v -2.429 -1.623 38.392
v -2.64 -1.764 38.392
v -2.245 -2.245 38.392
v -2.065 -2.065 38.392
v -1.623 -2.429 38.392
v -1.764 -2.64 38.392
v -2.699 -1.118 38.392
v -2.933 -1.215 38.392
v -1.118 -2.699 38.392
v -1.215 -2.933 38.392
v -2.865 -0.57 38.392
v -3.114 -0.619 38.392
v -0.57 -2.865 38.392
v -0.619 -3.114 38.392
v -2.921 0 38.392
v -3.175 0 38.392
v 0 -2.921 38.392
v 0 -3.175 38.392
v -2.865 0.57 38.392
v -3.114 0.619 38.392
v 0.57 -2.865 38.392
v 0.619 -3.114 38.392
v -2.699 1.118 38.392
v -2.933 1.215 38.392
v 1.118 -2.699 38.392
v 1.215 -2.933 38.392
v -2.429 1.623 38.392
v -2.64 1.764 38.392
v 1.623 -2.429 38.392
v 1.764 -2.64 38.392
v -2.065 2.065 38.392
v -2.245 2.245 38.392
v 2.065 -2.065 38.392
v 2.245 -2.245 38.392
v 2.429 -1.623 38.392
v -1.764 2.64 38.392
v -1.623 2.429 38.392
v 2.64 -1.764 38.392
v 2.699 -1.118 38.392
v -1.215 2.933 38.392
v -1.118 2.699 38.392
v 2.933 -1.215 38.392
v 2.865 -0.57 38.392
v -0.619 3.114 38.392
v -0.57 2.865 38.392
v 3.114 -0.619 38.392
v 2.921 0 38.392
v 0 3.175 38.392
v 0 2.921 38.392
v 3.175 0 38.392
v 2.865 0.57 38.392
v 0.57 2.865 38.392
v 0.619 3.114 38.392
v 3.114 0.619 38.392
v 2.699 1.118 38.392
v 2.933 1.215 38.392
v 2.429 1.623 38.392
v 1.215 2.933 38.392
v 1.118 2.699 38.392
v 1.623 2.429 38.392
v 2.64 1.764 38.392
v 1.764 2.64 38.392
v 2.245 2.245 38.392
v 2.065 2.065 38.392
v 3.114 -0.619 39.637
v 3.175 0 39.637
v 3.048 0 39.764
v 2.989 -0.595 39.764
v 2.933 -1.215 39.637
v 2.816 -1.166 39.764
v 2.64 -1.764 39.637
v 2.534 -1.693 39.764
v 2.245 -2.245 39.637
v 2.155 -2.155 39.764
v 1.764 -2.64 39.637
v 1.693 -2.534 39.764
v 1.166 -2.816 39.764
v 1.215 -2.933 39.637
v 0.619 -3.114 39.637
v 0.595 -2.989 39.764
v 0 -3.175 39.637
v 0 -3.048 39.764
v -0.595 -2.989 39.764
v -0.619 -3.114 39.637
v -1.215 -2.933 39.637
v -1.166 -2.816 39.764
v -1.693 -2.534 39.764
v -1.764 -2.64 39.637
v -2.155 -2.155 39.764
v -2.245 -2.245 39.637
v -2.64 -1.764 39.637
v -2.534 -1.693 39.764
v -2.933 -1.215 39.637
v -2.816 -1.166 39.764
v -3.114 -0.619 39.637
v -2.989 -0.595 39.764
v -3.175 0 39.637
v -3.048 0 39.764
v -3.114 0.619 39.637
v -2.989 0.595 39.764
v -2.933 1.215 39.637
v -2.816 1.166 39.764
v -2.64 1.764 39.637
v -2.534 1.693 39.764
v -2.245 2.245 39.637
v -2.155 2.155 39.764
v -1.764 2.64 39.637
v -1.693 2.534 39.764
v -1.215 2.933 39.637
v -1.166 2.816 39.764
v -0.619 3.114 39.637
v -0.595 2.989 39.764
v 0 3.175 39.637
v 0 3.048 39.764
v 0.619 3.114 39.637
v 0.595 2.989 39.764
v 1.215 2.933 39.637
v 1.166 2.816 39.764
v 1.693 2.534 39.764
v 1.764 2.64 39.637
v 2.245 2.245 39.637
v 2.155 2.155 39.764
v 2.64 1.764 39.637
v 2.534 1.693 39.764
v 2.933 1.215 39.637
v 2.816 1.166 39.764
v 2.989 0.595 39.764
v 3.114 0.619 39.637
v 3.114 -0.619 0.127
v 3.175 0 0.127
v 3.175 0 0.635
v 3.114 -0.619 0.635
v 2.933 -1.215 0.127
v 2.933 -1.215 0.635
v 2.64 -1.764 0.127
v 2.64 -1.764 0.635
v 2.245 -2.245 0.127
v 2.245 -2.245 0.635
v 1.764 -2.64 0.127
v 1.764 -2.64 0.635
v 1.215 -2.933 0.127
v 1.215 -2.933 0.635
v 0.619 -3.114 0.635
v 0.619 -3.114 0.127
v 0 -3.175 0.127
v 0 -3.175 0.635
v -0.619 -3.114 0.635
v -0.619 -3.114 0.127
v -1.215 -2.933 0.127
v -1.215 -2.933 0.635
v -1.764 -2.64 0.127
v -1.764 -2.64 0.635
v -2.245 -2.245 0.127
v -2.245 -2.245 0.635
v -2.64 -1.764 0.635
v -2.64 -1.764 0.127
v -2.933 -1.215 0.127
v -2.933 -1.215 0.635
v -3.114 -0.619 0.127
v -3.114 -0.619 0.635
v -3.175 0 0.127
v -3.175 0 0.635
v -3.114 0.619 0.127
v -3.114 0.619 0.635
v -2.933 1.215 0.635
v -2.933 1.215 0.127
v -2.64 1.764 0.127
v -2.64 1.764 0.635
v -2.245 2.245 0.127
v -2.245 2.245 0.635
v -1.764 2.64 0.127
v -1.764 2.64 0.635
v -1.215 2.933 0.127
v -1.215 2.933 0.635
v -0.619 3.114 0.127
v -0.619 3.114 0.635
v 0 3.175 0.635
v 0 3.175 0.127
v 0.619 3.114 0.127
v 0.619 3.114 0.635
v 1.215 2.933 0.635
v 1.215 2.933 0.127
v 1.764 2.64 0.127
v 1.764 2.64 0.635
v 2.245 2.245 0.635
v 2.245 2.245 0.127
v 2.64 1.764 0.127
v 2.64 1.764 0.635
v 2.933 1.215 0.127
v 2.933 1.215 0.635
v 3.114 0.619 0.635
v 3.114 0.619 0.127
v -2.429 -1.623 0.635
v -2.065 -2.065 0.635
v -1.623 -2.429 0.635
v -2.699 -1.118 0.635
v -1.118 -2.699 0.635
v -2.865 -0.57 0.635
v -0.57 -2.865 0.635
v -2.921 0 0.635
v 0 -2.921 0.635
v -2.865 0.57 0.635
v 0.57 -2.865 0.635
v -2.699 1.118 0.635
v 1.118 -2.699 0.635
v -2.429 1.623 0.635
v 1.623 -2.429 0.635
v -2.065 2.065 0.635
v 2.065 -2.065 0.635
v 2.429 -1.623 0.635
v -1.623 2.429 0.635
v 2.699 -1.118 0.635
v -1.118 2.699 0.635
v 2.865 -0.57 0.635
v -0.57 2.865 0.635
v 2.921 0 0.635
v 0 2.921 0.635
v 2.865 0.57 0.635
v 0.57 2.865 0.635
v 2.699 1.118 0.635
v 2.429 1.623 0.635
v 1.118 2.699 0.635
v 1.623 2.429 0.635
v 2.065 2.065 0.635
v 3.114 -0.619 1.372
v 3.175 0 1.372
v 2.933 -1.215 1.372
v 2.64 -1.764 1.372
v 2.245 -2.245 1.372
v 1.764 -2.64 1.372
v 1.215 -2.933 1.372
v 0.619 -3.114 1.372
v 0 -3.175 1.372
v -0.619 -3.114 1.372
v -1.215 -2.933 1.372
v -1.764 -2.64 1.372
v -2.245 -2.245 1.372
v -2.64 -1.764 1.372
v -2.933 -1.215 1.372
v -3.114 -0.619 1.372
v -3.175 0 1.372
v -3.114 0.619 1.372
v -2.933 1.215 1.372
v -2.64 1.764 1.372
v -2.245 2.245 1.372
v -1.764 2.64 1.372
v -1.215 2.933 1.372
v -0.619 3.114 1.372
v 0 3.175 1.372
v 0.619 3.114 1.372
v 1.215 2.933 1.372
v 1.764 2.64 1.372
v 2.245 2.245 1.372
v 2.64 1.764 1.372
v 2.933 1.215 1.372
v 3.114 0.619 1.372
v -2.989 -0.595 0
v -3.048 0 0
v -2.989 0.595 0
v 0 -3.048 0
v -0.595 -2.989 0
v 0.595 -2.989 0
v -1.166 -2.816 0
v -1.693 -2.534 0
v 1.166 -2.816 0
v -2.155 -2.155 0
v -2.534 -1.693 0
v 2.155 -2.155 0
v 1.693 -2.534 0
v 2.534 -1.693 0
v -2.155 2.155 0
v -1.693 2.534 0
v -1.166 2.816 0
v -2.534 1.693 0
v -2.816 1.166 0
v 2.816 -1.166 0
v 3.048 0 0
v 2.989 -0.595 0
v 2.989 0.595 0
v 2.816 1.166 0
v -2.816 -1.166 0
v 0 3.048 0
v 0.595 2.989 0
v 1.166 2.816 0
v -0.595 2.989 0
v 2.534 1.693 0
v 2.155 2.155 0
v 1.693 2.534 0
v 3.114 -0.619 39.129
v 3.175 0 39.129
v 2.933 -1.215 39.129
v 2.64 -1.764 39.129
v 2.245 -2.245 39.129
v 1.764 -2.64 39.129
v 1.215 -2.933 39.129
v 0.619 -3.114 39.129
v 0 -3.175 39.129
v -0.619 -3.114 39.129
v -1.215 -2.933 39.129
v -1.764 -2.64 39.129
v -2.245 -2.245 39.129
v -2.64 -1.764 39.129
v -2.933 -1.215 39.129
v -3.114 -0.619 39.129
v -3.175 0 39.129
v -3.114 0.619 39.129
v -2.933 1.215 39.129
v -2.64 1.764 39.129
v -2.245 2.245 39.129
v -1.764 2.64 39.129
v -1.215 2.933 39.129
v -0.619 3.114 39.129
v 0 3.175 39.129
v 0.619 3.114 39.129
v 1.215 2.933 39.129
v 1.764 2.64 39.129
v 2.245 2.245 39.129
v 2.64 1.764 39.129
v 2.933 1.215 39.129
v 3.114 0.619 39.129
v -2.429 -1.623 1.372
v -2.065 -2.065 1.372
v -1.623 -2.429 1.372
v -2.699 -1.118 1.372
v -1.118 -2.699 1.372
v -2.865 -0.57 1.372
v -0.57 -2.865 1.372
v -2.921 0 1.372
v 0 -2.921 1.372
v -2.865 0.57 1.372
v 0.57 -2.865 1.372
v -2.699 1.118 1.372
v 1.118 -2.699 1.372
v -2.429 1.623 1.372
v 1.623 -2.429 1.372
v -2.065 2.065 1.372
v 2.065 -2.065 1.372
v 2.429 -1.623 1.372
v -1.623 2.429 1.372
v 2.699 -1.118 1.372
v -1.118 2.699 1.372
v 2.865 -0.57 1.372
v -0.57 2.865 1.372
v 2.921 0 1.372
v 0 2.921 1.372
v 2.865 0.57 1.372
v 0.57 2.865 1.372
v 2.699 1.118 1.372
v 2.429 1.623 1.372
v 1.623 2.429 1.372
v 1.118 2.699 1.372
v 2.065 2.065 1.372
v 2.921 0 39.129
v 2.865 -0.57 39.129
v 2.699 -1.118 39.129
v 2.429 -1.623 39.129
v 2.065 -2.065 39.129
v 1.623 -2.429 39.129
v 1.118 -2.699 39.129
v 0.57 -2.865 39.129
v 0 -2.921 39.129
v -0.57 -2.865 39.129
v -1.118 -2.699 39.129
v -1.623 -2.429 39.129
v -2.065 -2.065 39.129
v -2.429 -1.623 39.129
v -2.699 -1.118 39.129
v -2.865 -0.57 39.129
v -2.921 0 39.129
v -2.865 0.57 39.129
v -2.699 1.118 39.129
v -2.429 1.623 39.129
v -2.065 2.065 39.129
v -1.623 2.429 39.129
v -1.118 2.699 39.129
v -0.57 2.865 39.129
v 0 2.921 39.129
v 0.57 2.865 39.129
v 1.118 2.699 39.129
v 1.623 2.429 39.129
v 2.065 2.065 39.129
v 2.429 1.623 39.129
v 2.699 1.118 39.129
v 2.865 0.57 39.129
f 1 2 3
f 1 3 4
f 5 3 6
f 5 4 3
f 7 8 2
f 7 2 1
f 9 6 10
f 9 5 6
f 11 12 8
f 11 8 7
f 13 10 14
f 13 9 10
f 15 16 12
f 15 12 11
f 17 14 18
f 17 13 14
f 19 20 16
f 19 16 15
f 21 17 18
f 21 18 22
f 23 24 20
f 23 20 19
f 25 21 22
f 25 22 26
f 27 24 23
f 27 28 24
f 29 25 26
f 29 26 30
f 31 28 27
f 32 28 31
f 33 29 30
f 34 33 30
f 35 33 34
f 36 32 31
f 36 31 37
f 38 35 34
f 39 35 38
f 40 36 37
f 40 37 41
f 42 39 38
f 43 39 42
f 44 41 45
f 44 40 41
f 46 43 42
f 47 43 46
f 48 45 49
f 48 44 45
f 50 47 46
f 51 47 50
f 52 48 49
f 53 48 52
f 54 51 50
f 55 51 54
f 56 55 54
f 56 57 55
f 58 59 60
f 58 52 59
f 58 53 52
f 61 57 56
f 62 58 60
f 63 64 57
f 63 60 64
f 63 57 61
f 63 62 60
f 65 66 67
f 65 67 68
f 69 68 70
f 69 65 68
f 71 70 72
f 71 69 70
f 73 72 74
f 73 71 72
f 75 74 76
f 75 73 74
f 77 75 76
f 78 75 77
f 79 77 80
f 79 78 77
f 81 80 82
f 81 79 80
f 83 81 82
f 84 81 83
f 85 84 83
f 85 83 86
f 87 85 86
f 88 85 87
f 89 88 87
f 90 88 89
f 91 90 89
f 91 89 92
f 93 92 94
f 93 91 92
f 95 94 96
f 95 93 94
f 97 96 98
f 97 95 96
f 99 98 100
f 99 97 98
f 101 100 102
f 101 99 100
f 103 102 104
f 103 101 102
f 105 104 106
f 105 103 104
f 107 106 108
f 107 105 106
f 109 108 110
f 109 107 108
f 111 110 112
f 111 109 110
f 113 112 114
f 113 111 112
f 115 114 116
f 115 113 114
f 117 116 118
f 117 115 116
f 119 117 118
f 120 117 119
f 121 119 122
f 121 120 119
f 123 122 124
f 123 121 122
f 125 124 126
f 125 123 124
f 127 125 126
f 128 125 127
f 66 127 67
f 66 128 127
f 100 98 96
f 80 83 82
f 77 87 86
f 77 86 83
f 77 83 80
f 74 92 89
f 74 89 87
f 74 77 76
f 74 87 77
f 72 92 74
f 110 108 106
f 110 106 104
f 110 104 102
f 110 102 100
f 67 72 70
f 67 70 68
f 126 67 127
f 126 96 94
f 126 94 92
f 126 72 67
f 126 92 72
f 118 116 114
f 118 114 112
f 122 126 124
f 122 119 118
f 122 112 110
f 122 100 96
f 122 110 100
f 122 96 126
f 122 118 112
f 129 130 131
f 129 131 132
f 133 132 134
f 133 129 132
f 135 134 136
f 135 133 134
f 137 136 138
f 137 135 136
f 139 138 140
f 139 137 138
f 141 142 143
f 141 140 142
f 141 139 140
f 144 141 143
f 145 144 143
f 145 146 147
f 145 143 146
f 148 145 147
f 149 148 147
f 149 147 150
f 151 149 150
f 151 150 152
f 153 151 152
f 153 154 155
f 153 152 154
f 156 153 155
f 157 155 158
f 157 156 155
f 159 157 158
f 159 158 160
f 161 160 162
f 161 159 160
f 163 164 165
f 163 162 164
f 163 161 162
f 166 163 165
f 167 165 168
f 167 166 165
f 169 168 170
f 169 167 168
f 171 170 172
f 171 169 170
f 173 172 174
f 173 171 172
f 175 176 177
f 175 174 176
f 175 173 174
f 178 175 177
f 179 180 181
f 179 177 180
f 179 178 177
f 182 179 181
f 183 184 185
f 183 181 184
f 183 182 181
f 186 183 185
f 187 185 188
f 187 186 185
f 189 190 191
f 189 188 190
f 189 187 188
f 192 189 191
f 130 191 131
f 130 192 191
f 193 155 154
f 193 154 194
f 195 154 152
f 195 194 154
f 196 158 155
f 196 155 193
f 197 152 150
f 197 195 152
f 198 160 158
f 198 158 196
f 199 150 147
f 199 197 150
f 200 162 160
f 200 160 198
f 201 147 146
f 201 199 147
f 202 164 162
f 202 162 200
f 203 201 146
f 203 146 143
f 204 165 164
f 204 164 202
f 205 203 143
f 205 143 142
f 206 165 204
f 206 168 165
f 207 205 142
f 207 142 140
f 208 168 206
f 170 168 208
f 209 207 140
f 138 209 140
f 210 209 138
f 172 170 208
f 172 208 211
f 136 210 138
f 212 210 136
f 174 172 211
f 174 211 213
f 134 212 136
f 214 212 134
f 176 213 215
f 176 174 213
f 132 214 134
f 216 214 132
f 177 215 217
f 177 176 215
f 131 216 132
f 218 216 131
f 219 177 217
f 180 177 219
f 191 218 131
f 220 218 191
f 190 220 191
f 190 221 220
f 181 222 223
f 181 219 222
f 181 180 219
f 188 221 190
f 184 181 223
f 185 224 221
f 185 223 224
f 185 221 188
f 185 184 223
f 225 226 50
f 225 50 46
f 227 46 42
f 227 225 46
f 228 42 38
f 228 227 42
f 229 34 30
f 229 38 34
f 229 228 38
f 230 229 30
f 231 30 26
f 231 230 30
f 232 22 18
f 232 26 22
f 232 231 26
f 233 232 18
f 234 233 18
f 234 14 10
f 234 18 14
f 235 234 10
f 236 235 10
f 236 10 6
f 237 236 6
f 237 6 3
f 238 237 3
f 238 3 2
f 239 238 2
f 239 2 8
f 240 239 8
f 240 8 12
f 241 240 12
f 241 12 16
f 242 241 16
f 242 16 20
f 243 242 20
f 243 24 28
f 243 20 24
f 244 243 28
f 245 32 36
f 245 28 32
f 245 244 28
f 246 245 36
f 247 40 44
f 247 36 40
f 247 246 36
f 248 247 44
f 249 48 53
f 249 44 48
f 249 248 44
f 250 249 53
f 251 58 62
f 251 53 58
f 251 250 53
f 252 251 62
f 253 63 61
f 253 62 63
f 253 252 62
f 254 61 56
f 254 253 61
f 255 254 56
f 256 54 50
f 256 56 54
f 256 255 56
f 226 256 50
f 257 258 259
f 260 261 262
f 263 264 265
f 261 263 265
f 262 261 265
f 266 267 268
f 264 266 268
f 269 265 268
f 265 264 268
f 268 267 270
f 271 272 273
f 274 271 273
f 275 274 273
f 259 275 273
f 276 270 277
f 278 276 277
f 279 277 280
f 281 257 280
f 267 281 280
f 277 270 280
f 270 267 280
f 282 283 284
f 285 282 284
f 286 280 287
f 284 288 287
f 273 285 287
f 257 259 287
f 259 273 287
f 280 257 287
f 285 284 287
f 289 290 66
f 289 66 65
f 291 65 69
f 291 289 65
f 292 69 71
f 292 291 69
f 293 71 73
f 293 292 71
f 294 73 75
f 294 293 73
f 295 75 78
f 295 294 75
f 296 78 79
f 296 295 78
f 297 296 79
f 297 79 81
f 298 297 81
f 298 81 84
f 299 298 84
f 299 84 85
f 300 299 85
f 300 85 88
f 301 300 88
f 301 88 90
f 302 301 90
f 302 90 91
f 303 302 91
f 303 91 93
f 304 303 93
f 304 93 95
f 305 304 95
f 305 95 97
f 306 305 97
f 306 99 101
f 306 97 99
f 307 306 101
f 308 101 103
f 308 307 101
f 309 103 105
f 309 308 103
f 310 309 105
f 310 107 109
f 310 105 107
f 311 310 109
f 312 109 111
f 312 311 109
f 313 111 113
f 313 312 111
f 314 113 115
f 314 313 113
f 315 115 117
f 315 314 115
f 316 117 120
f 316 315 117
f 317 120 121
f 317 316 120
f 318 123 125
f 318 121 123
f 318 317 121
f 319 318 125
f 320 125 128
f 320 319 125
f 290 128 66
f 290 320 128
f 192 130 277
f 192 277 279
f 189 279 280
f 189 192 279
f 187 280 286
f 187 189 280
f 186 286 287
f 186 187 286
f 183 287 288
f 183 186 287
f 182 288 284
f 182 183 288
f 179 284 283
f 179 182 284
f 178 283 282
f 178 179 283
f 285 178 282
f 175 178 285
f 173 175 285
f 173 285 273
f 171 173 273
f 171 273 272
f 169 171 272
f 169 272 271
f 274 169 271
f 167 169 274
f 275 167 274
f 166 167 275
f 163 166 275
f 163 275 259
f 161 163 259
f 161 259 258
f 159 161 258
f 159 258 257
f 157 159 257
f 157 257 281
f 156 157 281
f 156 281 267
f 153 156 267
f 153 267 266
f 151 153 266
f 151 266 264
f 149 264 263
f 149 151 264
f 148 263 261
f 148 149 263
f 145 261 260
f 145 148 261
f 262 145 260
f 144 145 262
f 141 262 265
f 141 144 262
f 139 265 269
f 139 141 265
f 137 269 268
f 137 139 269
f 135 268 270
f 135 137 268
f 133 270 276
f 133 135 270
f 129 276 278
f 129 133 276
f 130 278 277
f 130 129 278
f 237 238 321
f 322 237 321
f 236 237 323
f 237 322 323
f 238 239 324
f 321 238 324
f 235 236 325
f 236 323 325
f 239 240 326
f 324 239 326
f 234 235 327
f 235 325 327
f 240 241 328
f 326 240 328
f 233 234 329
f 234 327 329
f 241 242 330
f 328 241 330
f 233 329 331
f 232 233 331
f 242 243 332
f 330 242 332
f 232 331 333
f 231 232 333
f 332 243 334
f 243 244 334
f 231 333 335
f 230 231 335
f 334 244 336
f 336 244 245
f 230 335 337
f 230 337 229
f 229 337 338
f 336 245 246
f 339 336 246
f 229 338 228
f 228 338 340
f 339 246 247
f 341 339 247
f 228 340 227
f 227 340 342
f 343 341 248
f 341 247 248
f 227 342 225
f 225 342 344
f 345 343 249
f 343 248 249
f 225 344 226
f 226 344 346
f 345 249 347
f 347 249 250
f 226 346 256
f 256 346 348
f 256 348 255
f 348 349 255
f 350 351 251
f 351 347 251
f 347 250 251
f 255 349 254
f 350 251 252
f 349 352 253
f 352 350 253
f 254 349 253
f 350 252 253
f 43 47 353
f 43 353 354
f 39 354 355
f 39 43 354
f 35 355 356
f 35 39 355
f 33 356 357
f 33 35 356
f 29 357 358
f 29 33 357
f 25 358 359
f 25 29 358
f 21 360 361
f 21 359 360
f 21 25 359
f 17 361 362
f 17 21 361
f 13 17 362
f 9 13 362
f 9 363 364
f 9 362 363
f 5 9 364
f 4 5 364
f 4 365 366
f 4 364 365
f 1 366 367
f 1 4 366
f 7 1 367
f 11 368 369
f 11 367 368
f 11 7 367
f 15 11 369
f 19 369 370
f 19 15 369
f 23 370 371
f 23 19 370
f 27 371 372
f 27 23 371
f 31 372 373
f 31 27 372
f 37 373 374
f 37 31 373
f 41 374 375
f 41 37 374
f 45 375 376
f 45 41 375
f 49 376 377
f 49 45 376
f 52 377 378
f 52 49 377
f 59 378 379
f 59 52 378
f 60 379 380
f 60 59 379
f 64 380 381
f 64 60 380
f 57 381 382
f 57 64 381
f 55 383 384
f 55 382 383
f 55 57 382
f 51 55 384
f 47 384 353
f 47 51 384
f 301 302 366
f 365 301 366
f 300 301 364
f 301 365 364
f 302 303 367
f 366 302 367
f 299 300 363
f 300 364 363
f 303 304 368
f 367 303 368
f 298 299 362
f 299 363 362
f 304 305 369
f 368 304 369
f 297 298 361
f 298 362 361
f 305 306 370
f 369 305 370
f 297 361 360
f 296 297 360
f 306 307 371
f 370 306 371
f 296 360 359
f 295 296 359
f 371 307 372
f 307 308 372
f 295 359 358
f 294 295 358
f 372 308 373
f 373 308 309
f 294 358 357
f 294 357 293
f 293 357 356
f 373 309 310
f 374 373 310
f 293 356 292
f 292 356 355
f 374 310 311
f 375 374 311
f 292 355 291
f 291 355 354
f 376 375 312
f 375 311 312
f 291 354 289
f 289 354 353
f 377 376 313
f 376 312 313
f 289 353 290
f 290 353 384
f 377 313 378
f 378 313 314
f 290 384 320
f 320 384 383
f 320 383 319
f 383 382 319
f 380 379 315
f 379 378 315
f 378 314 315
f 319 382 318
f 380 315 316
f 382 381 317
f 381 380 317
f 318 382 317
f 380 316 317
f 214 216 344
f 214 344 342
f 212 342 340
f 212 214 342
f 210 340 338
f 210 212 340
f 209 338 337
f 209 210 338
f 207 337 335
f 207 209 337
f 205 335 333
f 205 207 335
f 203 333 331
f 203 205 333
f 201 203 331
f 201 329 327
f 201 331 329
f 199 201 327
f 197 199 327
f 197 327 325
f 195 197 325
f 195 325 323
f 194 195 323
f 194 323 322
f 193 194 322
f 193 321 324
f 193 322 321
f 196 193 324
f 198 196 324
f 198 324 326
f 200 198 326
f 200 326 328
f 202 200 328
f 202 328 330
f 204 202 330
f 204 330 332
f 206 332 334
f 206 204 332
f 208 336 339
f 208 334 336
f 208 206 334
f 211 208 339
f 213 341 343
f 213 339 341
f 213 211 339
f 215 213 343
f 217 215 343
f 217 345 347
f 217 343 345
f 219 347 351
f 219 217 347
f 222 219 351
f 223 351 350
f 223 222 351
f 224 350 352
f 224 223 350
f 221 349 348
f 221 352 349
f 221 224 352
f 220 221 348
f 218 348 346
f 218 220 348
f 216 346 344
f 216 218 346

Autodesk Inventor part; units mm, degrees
ref_plane "YZ Plane" through (0, 0, 0) normal (1, 0, 0) x (0, 1, 0)
ref_plane "XZ Plane" through (0, 0, 0) normal (0, 1, 0) x (-1, 0, 0)
ref_plane "XY Plane" through (0, 0, 0) normal (0, 0, 1) x (1, 0, 0)
sketch "Sketch1" plane through (0, 0, 0) normal (0, 0, 1) x (1, 0, 0)
  circle A0 centre (0, 0) radius 3.175
  dimension "d0" = 6.35
extrude "Extrusion1" add sketch "Sketch1" along normal blind 0.635
sketch "Sketch2" plane through (0, 0, 0.635) normal (0, 0, 1) x (1, 0, 0)
  circle A0 centre (0, 0) radius 3.175 projected
  circle A1 centre (0, 0) radius 2.921
  dimension "d6" = 5.842
extrude "Extrusion2" add sketch "Sketch2" along normal blind 0.7366 contours A1
sketch "Sketch3" plane through (0, 0, 1.3716) normal (0, 0, 1) x (1, 0, 0)
  circle A0 centre (0, 0) radius 2.921 projected
  circle A1 centre (0, 0) radius 3.175
  dimension "d10" = 6.35
extrude "Extrusion3" add sketch "Sketch3" along normal blind 37.0205 contours A0 | A1
sketch "Sketch4" plane through (0, 0, 38.3921) normal (0, 0, 1) x (1, 0, 0)
  circle A0 centre (0, 0) radius 3.175 projected
  circle A1 centre (0, 0) radius 2.921
  dimension "d13" = 5.842
extrude "Extrusion4" add sketch "Sketch4" along normal blind 0.7366 contours A1
sketch "Sketch5" plane through (0, 0, 39.1287) normal (0, 0, 1) x (1, 0, 0)
  circle A0 centre (0, 0) radius 2.921 projected
  circle A1 centre (0, 0) radius 3.175
  dimension "d16" = 6.35
extrude "Extrusion5" add sketch "Sketch5" along normal blind 0.635 contours A0 | A1
chamfer "Chamfer1" distance 0.127 angle 45 2 edges at (-3.175, 0, 0) (-3.175, 0, 39.7637)
properties part number "Belt Shaft"
